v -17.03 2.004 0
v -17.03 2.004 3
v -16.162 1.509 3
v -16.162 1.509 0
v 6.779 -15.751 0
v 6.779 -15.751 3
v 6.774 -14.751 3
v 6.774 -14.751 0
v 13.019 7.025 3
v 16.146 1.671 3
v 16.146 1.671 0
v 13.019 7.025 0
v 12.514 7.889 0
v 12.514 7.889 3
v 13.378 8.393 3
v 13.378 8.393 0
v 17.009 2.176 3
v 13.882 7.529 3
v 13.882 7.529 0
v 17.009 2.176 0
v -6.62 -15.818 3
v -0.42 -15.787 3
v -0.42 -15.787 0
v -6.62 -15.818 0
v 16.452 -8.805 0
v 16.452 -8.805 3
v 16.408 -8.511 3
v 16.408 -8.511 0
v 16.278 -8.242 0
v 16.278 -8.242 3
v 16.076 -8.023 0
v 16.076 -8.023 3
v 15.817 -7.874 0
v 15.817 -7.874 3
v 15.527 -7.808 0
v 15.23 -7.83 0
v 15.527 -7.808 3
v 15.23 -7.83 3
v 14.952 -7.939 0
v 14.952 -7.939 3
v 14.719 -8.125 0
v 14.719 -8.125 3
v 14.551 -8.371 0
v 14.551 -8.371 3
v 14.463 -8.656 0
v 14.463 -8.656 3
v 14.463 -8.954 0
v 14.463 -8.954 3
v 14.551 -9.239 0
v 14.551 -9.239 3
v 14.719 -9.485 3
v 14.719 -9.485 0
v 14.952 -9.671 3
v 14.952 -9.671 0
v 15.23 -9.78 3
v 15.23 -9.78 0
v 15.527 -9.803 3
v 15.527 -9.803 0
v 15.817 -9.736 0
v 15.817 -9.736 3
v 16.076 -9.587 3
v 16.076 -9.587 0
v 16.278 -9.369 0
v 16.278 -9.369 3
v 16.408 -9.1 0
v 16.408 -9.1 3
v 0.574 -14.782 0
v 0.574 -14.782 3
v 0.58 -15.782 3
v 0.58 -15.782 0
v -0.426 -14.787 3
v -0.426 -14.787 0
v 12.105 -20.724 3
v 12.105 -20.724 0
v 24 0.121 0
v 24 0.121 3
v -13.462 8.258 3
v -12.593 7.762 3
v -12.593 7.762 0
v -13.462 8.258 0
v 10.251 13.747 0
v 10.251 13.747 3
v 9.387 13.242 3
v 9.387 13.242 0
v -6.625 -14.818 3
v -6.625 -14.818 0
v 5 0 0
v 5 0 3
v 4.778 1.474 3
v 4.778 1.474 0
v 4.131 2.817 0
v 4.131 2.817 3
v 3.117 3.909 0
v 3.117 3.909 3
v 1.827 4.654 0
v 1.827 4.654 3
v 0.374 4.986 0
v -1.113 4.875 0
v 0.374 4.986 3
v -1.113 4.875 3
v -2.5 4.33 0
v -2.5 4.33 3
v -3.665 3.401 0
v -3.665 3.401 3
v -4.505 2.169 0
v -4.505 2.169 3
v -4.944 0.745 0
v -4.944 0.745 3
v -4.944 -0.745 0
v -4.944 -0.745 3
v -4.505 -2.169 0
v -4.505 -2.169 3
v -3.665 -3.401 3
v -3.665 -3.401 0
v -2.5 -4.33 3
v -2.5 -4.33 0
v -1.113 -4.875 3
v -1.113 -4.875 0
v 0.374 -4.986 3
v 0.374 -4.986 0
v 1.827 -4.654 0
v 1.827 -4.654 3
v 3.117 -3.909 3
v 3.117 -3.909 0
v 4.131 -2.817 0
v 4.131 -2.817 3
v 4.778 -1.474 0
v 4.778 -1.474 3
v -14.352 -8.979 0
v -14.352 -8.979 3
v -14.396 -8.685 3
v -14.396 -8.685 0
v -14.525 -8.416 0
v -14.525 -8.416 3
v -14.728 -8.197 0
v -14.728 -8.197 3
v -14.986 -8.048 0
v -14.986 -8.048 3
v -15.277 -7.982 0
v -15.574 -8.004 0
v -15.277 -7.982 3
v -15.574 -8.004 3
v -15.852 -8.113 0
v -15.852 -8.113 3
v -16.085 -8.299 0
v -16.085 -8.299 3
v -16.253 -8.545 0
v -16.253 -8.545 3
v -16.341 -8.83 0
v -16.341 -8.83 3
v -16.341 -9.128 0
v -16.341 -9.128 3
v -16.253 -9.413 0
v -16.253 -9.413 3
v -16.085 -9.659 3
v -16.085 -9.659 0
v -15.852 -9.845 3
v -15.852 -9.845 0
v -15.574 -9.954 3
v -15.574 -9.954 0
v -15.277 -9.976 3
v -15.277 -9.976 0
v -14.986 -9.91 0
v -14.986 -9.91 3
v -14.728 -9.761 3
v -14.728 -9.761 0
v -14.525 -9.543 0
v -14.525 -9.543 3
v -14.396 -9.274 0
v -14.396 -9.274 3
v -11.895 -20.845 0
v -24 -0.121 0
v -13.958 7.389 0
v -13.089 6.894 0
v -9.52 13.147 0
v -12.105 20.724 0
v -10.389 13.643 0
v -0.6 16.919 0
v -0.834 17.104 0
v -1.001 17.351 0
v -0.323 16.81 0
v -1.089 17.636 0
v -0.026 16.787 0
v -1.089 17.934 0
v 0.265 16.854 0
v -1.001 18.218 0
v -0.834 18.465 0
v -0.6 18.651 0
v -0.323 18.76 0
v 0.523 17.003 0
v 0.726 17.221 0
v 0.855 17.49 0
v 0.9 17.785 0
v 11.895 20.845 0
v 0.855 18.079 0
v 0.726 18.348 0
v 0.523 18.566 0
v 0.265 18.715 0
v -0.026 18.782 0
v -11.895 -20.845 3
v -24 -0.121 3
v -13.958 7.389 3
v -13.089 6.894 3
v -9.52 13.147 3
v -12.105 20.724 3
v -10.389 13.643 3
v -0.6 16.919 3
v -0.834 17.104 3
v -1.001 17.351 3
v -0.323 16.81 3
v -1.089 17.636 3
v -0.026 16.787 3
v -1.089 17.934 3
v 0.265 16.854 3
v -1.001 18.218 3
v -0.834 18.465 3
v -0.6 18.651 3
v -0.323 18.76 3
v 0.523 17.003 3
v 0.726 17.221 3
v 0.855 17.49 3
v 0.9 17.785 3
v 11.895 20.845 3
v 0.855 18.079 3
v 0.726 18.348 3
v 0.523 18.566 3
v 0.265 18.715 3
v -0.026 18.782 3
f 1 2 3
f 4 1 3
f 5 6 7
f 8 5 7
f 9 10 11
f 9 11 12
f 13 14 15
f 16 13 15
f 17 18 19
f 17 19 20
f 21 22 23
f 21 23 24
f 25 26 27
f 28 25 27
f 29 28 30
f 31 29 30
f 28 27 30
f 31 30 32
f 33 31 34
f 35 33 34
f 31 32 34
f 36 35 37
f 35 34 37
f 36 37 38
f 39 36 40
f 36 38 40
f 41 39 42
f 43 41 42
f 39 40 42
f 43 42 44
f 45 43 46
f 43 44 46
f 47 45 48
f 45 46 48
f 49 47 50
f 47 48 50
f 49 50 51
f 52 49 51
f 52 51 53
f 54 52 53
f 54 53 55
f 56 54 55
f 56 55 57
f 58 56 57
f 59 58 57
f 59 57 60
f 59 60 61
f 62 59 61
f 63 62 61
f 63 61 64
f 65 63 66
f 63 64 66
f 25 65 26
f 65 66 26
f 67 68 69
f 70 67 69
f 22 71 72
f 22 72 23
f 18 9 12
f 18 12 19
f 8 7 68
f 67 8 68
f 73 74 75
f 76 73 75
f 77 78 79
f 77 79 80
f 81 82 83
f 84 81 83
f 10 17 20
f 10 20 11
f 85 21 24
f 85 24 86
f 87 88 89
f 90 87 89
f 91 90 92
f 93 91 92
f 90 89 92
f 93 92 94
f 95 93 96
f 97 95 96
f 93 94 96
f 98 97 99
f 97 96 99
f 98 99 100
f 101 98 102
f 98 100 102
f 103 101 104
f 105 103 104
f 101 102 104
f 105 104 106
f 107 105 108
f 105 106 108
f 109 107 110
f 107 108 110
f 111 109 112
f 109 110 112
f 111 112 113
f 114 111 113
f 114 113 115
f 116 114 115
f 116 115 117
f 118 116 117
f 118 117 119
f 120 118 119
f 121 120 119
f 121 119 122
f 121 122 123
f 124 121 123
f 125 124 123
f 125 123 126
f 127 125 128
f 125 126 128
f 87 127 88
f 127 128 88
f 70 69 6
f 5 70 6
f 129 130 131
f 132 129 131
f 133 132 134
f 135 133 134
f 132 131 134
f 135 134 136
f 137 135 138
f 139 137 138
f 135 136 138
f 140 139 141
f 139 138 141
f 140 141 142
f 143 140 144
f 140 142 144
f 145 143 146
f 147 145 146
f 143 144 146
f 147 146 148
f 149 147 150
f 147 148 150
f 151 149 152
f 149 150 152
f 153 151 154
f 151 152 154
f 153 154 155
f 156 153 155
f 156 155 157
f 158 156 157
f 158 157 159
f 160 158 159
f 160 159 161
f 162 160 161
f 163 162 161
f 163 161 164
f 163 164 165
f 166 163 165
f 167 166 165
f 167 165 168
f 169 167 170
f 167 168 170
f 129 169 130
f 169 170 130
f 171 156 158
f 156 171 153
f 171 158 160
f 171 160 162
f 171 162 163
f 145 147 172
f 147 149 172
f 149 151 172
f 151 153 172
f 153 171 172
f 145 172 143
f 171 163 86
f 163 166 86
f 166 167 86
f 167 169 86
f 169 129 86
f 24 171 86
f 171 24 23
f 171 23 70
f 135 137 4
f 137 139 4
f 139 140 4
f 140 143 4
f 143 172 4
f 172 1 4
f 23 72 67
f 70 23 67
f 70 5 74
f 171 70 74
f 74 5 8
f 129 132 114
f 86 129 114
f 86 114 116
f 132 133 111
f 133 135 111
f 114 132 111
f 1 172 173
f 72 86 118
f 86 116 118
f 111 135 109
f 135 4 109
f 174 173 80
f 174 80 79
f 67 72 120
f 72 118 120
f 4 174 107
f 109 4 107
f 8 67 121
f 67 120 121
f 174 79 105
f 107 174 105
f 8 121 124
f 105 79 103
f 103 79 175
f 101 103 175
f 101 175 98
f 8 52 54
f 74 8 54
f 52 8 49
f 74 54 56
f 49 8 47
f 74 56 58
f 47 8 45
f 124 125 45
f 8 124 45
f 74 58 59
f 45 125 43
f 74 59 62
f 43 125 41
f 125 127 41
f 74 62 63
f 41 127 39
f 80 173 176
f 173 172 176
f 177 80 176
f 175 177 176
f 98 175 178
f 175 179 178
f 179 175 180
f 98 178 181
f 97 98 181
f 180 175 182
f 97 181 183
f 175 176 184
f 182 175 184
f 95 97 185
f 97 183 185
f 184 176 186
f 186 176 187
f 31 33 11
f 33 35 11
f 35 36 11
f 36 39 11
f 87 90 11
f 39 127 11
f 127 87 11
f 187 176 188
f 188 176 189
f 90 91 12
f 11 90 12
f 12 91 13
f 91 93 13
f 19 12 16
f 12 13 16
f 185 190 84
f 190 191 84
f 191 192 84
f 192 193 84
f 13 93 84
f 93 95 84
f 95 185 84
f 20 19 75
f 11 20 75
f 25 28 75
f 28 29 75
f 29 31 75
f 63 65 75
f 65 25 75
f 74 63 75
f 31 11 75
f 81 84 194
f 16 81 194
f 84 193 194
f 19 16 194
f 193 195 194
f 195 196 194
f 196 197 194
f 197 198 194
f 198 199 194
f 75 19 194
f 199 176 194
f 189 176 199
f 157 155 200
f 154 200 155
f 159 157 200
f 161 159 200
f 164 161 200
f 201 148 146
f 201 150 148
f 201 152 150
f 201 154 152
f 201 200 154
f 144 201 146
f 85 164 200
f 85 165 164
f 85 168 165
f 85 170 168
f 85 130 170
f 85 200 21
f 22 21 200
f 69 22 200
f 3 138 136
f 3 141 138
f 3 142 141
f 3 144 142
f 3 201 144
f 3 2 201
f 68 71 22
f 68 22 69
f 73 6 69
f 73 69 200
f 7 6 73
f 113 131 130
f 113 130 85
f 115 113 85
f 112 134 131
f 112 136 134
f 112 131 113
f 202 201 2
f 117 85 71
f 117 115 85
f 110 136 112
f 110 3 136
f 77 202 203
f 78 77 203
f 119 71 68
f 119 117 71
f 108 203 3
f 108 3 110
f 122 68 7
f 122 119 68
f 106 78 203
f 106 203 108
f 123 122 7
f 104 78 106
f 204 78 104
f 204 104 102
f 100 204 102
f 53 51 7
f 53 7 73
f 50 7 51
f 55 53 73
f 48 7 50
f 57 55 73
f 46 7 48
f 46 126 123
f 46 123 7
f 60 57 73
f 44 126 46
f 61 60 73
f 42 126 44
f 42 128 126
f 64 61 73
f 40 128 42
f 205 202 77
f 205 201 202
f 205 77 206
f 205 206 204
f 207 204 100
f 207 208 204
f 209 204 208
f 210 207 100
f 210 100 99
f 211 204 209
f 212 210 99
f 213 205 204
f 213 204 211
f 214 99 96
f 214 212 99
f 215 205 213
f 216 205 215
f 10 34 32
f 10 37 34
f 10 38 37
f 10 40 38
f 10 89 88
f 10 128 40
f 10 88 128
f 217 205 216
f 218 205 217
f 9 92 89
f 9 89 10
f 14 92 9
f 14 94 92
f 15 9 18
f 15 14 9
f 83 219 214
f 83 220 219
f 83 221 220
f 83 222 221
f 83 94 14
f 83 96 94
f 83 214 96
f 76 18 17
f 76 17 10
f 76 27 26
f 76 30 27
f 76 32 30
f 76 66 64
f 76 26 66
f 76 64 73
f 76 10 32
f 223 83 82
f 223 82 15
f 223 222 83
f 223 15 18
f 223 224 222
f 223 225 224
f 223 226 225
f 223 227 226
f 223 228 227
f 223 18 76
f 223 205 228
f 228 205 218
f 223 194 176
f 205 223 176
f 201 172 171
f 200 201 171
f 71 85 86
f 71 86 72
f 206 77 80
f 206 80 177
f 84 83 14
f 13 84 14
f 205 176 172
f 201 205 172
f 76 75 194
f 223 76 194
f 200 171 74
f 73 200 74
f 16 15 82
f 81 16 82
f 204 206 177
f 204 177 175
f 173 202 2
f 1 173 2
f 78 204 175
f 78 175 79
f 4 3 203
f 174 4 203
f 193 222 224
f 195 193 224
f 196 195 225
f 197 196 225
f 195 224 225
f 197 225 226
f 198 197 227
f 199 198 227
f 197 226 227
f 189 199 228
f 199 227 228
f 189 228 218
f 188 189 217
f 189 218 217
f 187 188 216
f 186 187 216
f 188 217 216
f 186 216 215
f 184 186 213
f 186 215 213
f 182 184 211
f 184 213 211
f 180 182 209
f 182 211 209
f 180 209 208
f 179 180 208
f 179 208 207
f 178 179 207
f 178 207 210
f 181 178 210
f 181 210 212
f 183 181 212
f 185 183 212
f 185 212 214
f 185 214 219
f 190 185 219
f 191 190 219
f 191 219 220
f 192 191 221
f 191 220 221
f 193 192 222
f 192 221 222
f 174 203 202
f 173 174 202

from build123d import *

# Parameters (mm, degrees)
EXTRUDE_1_DEPTH     = 3
CUT_EXTRUDE_1_DEPTH = 3
SKETCH_3_R          = 5
CUT_EXTRUDE_2_DEPTH = 3
SKETCH_6_R          = 1
CUT_EXTRUDE_3_DEPTH = 3


with BuildPart() as part:
    # 草图1 → 凸台-拉伸1 (new body)
    with BuildSketch(Plane.XY):
        Polygon((11.895283312, 20.845067899), (-12.104716688, 20.724151483), (-24, -0.120916416), (-11.895283312, -20.845067899), (12.104716688, -20.724151483), (24, 0.120916416), align=None)
    extrude(amount=EXTRUDE_1_DEPTH)

    # 草图2 → 切除-拉伸1 (cut)
    with BuildSketch(Plane.XY.offset(3)):
        Polygon((10.250974371, 13.746627049), (9.387479018, 13.242270255), (12.514491143, 7.888599068), (13.377986495, 8.392955863), align=None)
        Polygon((13.018847937, 7.025103716), (13.88234329, 7.52946051), (17.009355414, 2.175789323), (16.145860061, 1.671432529), align=None)
        Polygon((6.779441055, -15.750917743), (6.774402935, -14.750930435), (0.574481622, -14.782166779), (0.579519742, -15.782154088), align=None)
        Polygon((-0.425505687, -14.787204899), (-0.420467566, -15.787192208), (-6.62038888, -15.818428552), (-6.625427, -14.818441244), align=None)
        Polygon((-17.030415426, 2.004290694), (-16.161881954, 1.50866018), (-13.088972765, 6.893567711), (-13.957506238, 7.389198225), align=None)
        Polygon((-12.59334225, 7.762101184), (-13.461875723, 8.257731698), (-10.388966534, 13.642639229), (-9.520433062, 13.147008715), align=None)
    extrude(amount=-CUT_EXTRUDE_1_DEPTH, mode=Mode.SUBTRACT)

    # 草图3 → 切除-拉伸2 (cut)
    with BuildSketch(Plane.XY.offset(3)):
        Circle(SKETCH_3_R)
    extrude(amount=-CUT_EXTRUDE_2_DEPTH, mode=Mode.SUBTRACT)

    # 草图6 → 切除-拉伸3 (cut)
    with BuildSketch(Plane.XY.offset(3)):
        with Locations((-0.100452801, 17.784593098)):
            Circle(SKETCH_6_R)
        with Locations((15.45213582, -8.805301872)):
            Circle(SKETCH_6_R)
        with Locations((-15.351683019, -8.979291227)):
            Circle(SKETCH_6_R)
    extrude(amount=-CUT_EXTRUDE_3_DEPTH, mode=Mode.SUBTRACT)


solid = part.part
